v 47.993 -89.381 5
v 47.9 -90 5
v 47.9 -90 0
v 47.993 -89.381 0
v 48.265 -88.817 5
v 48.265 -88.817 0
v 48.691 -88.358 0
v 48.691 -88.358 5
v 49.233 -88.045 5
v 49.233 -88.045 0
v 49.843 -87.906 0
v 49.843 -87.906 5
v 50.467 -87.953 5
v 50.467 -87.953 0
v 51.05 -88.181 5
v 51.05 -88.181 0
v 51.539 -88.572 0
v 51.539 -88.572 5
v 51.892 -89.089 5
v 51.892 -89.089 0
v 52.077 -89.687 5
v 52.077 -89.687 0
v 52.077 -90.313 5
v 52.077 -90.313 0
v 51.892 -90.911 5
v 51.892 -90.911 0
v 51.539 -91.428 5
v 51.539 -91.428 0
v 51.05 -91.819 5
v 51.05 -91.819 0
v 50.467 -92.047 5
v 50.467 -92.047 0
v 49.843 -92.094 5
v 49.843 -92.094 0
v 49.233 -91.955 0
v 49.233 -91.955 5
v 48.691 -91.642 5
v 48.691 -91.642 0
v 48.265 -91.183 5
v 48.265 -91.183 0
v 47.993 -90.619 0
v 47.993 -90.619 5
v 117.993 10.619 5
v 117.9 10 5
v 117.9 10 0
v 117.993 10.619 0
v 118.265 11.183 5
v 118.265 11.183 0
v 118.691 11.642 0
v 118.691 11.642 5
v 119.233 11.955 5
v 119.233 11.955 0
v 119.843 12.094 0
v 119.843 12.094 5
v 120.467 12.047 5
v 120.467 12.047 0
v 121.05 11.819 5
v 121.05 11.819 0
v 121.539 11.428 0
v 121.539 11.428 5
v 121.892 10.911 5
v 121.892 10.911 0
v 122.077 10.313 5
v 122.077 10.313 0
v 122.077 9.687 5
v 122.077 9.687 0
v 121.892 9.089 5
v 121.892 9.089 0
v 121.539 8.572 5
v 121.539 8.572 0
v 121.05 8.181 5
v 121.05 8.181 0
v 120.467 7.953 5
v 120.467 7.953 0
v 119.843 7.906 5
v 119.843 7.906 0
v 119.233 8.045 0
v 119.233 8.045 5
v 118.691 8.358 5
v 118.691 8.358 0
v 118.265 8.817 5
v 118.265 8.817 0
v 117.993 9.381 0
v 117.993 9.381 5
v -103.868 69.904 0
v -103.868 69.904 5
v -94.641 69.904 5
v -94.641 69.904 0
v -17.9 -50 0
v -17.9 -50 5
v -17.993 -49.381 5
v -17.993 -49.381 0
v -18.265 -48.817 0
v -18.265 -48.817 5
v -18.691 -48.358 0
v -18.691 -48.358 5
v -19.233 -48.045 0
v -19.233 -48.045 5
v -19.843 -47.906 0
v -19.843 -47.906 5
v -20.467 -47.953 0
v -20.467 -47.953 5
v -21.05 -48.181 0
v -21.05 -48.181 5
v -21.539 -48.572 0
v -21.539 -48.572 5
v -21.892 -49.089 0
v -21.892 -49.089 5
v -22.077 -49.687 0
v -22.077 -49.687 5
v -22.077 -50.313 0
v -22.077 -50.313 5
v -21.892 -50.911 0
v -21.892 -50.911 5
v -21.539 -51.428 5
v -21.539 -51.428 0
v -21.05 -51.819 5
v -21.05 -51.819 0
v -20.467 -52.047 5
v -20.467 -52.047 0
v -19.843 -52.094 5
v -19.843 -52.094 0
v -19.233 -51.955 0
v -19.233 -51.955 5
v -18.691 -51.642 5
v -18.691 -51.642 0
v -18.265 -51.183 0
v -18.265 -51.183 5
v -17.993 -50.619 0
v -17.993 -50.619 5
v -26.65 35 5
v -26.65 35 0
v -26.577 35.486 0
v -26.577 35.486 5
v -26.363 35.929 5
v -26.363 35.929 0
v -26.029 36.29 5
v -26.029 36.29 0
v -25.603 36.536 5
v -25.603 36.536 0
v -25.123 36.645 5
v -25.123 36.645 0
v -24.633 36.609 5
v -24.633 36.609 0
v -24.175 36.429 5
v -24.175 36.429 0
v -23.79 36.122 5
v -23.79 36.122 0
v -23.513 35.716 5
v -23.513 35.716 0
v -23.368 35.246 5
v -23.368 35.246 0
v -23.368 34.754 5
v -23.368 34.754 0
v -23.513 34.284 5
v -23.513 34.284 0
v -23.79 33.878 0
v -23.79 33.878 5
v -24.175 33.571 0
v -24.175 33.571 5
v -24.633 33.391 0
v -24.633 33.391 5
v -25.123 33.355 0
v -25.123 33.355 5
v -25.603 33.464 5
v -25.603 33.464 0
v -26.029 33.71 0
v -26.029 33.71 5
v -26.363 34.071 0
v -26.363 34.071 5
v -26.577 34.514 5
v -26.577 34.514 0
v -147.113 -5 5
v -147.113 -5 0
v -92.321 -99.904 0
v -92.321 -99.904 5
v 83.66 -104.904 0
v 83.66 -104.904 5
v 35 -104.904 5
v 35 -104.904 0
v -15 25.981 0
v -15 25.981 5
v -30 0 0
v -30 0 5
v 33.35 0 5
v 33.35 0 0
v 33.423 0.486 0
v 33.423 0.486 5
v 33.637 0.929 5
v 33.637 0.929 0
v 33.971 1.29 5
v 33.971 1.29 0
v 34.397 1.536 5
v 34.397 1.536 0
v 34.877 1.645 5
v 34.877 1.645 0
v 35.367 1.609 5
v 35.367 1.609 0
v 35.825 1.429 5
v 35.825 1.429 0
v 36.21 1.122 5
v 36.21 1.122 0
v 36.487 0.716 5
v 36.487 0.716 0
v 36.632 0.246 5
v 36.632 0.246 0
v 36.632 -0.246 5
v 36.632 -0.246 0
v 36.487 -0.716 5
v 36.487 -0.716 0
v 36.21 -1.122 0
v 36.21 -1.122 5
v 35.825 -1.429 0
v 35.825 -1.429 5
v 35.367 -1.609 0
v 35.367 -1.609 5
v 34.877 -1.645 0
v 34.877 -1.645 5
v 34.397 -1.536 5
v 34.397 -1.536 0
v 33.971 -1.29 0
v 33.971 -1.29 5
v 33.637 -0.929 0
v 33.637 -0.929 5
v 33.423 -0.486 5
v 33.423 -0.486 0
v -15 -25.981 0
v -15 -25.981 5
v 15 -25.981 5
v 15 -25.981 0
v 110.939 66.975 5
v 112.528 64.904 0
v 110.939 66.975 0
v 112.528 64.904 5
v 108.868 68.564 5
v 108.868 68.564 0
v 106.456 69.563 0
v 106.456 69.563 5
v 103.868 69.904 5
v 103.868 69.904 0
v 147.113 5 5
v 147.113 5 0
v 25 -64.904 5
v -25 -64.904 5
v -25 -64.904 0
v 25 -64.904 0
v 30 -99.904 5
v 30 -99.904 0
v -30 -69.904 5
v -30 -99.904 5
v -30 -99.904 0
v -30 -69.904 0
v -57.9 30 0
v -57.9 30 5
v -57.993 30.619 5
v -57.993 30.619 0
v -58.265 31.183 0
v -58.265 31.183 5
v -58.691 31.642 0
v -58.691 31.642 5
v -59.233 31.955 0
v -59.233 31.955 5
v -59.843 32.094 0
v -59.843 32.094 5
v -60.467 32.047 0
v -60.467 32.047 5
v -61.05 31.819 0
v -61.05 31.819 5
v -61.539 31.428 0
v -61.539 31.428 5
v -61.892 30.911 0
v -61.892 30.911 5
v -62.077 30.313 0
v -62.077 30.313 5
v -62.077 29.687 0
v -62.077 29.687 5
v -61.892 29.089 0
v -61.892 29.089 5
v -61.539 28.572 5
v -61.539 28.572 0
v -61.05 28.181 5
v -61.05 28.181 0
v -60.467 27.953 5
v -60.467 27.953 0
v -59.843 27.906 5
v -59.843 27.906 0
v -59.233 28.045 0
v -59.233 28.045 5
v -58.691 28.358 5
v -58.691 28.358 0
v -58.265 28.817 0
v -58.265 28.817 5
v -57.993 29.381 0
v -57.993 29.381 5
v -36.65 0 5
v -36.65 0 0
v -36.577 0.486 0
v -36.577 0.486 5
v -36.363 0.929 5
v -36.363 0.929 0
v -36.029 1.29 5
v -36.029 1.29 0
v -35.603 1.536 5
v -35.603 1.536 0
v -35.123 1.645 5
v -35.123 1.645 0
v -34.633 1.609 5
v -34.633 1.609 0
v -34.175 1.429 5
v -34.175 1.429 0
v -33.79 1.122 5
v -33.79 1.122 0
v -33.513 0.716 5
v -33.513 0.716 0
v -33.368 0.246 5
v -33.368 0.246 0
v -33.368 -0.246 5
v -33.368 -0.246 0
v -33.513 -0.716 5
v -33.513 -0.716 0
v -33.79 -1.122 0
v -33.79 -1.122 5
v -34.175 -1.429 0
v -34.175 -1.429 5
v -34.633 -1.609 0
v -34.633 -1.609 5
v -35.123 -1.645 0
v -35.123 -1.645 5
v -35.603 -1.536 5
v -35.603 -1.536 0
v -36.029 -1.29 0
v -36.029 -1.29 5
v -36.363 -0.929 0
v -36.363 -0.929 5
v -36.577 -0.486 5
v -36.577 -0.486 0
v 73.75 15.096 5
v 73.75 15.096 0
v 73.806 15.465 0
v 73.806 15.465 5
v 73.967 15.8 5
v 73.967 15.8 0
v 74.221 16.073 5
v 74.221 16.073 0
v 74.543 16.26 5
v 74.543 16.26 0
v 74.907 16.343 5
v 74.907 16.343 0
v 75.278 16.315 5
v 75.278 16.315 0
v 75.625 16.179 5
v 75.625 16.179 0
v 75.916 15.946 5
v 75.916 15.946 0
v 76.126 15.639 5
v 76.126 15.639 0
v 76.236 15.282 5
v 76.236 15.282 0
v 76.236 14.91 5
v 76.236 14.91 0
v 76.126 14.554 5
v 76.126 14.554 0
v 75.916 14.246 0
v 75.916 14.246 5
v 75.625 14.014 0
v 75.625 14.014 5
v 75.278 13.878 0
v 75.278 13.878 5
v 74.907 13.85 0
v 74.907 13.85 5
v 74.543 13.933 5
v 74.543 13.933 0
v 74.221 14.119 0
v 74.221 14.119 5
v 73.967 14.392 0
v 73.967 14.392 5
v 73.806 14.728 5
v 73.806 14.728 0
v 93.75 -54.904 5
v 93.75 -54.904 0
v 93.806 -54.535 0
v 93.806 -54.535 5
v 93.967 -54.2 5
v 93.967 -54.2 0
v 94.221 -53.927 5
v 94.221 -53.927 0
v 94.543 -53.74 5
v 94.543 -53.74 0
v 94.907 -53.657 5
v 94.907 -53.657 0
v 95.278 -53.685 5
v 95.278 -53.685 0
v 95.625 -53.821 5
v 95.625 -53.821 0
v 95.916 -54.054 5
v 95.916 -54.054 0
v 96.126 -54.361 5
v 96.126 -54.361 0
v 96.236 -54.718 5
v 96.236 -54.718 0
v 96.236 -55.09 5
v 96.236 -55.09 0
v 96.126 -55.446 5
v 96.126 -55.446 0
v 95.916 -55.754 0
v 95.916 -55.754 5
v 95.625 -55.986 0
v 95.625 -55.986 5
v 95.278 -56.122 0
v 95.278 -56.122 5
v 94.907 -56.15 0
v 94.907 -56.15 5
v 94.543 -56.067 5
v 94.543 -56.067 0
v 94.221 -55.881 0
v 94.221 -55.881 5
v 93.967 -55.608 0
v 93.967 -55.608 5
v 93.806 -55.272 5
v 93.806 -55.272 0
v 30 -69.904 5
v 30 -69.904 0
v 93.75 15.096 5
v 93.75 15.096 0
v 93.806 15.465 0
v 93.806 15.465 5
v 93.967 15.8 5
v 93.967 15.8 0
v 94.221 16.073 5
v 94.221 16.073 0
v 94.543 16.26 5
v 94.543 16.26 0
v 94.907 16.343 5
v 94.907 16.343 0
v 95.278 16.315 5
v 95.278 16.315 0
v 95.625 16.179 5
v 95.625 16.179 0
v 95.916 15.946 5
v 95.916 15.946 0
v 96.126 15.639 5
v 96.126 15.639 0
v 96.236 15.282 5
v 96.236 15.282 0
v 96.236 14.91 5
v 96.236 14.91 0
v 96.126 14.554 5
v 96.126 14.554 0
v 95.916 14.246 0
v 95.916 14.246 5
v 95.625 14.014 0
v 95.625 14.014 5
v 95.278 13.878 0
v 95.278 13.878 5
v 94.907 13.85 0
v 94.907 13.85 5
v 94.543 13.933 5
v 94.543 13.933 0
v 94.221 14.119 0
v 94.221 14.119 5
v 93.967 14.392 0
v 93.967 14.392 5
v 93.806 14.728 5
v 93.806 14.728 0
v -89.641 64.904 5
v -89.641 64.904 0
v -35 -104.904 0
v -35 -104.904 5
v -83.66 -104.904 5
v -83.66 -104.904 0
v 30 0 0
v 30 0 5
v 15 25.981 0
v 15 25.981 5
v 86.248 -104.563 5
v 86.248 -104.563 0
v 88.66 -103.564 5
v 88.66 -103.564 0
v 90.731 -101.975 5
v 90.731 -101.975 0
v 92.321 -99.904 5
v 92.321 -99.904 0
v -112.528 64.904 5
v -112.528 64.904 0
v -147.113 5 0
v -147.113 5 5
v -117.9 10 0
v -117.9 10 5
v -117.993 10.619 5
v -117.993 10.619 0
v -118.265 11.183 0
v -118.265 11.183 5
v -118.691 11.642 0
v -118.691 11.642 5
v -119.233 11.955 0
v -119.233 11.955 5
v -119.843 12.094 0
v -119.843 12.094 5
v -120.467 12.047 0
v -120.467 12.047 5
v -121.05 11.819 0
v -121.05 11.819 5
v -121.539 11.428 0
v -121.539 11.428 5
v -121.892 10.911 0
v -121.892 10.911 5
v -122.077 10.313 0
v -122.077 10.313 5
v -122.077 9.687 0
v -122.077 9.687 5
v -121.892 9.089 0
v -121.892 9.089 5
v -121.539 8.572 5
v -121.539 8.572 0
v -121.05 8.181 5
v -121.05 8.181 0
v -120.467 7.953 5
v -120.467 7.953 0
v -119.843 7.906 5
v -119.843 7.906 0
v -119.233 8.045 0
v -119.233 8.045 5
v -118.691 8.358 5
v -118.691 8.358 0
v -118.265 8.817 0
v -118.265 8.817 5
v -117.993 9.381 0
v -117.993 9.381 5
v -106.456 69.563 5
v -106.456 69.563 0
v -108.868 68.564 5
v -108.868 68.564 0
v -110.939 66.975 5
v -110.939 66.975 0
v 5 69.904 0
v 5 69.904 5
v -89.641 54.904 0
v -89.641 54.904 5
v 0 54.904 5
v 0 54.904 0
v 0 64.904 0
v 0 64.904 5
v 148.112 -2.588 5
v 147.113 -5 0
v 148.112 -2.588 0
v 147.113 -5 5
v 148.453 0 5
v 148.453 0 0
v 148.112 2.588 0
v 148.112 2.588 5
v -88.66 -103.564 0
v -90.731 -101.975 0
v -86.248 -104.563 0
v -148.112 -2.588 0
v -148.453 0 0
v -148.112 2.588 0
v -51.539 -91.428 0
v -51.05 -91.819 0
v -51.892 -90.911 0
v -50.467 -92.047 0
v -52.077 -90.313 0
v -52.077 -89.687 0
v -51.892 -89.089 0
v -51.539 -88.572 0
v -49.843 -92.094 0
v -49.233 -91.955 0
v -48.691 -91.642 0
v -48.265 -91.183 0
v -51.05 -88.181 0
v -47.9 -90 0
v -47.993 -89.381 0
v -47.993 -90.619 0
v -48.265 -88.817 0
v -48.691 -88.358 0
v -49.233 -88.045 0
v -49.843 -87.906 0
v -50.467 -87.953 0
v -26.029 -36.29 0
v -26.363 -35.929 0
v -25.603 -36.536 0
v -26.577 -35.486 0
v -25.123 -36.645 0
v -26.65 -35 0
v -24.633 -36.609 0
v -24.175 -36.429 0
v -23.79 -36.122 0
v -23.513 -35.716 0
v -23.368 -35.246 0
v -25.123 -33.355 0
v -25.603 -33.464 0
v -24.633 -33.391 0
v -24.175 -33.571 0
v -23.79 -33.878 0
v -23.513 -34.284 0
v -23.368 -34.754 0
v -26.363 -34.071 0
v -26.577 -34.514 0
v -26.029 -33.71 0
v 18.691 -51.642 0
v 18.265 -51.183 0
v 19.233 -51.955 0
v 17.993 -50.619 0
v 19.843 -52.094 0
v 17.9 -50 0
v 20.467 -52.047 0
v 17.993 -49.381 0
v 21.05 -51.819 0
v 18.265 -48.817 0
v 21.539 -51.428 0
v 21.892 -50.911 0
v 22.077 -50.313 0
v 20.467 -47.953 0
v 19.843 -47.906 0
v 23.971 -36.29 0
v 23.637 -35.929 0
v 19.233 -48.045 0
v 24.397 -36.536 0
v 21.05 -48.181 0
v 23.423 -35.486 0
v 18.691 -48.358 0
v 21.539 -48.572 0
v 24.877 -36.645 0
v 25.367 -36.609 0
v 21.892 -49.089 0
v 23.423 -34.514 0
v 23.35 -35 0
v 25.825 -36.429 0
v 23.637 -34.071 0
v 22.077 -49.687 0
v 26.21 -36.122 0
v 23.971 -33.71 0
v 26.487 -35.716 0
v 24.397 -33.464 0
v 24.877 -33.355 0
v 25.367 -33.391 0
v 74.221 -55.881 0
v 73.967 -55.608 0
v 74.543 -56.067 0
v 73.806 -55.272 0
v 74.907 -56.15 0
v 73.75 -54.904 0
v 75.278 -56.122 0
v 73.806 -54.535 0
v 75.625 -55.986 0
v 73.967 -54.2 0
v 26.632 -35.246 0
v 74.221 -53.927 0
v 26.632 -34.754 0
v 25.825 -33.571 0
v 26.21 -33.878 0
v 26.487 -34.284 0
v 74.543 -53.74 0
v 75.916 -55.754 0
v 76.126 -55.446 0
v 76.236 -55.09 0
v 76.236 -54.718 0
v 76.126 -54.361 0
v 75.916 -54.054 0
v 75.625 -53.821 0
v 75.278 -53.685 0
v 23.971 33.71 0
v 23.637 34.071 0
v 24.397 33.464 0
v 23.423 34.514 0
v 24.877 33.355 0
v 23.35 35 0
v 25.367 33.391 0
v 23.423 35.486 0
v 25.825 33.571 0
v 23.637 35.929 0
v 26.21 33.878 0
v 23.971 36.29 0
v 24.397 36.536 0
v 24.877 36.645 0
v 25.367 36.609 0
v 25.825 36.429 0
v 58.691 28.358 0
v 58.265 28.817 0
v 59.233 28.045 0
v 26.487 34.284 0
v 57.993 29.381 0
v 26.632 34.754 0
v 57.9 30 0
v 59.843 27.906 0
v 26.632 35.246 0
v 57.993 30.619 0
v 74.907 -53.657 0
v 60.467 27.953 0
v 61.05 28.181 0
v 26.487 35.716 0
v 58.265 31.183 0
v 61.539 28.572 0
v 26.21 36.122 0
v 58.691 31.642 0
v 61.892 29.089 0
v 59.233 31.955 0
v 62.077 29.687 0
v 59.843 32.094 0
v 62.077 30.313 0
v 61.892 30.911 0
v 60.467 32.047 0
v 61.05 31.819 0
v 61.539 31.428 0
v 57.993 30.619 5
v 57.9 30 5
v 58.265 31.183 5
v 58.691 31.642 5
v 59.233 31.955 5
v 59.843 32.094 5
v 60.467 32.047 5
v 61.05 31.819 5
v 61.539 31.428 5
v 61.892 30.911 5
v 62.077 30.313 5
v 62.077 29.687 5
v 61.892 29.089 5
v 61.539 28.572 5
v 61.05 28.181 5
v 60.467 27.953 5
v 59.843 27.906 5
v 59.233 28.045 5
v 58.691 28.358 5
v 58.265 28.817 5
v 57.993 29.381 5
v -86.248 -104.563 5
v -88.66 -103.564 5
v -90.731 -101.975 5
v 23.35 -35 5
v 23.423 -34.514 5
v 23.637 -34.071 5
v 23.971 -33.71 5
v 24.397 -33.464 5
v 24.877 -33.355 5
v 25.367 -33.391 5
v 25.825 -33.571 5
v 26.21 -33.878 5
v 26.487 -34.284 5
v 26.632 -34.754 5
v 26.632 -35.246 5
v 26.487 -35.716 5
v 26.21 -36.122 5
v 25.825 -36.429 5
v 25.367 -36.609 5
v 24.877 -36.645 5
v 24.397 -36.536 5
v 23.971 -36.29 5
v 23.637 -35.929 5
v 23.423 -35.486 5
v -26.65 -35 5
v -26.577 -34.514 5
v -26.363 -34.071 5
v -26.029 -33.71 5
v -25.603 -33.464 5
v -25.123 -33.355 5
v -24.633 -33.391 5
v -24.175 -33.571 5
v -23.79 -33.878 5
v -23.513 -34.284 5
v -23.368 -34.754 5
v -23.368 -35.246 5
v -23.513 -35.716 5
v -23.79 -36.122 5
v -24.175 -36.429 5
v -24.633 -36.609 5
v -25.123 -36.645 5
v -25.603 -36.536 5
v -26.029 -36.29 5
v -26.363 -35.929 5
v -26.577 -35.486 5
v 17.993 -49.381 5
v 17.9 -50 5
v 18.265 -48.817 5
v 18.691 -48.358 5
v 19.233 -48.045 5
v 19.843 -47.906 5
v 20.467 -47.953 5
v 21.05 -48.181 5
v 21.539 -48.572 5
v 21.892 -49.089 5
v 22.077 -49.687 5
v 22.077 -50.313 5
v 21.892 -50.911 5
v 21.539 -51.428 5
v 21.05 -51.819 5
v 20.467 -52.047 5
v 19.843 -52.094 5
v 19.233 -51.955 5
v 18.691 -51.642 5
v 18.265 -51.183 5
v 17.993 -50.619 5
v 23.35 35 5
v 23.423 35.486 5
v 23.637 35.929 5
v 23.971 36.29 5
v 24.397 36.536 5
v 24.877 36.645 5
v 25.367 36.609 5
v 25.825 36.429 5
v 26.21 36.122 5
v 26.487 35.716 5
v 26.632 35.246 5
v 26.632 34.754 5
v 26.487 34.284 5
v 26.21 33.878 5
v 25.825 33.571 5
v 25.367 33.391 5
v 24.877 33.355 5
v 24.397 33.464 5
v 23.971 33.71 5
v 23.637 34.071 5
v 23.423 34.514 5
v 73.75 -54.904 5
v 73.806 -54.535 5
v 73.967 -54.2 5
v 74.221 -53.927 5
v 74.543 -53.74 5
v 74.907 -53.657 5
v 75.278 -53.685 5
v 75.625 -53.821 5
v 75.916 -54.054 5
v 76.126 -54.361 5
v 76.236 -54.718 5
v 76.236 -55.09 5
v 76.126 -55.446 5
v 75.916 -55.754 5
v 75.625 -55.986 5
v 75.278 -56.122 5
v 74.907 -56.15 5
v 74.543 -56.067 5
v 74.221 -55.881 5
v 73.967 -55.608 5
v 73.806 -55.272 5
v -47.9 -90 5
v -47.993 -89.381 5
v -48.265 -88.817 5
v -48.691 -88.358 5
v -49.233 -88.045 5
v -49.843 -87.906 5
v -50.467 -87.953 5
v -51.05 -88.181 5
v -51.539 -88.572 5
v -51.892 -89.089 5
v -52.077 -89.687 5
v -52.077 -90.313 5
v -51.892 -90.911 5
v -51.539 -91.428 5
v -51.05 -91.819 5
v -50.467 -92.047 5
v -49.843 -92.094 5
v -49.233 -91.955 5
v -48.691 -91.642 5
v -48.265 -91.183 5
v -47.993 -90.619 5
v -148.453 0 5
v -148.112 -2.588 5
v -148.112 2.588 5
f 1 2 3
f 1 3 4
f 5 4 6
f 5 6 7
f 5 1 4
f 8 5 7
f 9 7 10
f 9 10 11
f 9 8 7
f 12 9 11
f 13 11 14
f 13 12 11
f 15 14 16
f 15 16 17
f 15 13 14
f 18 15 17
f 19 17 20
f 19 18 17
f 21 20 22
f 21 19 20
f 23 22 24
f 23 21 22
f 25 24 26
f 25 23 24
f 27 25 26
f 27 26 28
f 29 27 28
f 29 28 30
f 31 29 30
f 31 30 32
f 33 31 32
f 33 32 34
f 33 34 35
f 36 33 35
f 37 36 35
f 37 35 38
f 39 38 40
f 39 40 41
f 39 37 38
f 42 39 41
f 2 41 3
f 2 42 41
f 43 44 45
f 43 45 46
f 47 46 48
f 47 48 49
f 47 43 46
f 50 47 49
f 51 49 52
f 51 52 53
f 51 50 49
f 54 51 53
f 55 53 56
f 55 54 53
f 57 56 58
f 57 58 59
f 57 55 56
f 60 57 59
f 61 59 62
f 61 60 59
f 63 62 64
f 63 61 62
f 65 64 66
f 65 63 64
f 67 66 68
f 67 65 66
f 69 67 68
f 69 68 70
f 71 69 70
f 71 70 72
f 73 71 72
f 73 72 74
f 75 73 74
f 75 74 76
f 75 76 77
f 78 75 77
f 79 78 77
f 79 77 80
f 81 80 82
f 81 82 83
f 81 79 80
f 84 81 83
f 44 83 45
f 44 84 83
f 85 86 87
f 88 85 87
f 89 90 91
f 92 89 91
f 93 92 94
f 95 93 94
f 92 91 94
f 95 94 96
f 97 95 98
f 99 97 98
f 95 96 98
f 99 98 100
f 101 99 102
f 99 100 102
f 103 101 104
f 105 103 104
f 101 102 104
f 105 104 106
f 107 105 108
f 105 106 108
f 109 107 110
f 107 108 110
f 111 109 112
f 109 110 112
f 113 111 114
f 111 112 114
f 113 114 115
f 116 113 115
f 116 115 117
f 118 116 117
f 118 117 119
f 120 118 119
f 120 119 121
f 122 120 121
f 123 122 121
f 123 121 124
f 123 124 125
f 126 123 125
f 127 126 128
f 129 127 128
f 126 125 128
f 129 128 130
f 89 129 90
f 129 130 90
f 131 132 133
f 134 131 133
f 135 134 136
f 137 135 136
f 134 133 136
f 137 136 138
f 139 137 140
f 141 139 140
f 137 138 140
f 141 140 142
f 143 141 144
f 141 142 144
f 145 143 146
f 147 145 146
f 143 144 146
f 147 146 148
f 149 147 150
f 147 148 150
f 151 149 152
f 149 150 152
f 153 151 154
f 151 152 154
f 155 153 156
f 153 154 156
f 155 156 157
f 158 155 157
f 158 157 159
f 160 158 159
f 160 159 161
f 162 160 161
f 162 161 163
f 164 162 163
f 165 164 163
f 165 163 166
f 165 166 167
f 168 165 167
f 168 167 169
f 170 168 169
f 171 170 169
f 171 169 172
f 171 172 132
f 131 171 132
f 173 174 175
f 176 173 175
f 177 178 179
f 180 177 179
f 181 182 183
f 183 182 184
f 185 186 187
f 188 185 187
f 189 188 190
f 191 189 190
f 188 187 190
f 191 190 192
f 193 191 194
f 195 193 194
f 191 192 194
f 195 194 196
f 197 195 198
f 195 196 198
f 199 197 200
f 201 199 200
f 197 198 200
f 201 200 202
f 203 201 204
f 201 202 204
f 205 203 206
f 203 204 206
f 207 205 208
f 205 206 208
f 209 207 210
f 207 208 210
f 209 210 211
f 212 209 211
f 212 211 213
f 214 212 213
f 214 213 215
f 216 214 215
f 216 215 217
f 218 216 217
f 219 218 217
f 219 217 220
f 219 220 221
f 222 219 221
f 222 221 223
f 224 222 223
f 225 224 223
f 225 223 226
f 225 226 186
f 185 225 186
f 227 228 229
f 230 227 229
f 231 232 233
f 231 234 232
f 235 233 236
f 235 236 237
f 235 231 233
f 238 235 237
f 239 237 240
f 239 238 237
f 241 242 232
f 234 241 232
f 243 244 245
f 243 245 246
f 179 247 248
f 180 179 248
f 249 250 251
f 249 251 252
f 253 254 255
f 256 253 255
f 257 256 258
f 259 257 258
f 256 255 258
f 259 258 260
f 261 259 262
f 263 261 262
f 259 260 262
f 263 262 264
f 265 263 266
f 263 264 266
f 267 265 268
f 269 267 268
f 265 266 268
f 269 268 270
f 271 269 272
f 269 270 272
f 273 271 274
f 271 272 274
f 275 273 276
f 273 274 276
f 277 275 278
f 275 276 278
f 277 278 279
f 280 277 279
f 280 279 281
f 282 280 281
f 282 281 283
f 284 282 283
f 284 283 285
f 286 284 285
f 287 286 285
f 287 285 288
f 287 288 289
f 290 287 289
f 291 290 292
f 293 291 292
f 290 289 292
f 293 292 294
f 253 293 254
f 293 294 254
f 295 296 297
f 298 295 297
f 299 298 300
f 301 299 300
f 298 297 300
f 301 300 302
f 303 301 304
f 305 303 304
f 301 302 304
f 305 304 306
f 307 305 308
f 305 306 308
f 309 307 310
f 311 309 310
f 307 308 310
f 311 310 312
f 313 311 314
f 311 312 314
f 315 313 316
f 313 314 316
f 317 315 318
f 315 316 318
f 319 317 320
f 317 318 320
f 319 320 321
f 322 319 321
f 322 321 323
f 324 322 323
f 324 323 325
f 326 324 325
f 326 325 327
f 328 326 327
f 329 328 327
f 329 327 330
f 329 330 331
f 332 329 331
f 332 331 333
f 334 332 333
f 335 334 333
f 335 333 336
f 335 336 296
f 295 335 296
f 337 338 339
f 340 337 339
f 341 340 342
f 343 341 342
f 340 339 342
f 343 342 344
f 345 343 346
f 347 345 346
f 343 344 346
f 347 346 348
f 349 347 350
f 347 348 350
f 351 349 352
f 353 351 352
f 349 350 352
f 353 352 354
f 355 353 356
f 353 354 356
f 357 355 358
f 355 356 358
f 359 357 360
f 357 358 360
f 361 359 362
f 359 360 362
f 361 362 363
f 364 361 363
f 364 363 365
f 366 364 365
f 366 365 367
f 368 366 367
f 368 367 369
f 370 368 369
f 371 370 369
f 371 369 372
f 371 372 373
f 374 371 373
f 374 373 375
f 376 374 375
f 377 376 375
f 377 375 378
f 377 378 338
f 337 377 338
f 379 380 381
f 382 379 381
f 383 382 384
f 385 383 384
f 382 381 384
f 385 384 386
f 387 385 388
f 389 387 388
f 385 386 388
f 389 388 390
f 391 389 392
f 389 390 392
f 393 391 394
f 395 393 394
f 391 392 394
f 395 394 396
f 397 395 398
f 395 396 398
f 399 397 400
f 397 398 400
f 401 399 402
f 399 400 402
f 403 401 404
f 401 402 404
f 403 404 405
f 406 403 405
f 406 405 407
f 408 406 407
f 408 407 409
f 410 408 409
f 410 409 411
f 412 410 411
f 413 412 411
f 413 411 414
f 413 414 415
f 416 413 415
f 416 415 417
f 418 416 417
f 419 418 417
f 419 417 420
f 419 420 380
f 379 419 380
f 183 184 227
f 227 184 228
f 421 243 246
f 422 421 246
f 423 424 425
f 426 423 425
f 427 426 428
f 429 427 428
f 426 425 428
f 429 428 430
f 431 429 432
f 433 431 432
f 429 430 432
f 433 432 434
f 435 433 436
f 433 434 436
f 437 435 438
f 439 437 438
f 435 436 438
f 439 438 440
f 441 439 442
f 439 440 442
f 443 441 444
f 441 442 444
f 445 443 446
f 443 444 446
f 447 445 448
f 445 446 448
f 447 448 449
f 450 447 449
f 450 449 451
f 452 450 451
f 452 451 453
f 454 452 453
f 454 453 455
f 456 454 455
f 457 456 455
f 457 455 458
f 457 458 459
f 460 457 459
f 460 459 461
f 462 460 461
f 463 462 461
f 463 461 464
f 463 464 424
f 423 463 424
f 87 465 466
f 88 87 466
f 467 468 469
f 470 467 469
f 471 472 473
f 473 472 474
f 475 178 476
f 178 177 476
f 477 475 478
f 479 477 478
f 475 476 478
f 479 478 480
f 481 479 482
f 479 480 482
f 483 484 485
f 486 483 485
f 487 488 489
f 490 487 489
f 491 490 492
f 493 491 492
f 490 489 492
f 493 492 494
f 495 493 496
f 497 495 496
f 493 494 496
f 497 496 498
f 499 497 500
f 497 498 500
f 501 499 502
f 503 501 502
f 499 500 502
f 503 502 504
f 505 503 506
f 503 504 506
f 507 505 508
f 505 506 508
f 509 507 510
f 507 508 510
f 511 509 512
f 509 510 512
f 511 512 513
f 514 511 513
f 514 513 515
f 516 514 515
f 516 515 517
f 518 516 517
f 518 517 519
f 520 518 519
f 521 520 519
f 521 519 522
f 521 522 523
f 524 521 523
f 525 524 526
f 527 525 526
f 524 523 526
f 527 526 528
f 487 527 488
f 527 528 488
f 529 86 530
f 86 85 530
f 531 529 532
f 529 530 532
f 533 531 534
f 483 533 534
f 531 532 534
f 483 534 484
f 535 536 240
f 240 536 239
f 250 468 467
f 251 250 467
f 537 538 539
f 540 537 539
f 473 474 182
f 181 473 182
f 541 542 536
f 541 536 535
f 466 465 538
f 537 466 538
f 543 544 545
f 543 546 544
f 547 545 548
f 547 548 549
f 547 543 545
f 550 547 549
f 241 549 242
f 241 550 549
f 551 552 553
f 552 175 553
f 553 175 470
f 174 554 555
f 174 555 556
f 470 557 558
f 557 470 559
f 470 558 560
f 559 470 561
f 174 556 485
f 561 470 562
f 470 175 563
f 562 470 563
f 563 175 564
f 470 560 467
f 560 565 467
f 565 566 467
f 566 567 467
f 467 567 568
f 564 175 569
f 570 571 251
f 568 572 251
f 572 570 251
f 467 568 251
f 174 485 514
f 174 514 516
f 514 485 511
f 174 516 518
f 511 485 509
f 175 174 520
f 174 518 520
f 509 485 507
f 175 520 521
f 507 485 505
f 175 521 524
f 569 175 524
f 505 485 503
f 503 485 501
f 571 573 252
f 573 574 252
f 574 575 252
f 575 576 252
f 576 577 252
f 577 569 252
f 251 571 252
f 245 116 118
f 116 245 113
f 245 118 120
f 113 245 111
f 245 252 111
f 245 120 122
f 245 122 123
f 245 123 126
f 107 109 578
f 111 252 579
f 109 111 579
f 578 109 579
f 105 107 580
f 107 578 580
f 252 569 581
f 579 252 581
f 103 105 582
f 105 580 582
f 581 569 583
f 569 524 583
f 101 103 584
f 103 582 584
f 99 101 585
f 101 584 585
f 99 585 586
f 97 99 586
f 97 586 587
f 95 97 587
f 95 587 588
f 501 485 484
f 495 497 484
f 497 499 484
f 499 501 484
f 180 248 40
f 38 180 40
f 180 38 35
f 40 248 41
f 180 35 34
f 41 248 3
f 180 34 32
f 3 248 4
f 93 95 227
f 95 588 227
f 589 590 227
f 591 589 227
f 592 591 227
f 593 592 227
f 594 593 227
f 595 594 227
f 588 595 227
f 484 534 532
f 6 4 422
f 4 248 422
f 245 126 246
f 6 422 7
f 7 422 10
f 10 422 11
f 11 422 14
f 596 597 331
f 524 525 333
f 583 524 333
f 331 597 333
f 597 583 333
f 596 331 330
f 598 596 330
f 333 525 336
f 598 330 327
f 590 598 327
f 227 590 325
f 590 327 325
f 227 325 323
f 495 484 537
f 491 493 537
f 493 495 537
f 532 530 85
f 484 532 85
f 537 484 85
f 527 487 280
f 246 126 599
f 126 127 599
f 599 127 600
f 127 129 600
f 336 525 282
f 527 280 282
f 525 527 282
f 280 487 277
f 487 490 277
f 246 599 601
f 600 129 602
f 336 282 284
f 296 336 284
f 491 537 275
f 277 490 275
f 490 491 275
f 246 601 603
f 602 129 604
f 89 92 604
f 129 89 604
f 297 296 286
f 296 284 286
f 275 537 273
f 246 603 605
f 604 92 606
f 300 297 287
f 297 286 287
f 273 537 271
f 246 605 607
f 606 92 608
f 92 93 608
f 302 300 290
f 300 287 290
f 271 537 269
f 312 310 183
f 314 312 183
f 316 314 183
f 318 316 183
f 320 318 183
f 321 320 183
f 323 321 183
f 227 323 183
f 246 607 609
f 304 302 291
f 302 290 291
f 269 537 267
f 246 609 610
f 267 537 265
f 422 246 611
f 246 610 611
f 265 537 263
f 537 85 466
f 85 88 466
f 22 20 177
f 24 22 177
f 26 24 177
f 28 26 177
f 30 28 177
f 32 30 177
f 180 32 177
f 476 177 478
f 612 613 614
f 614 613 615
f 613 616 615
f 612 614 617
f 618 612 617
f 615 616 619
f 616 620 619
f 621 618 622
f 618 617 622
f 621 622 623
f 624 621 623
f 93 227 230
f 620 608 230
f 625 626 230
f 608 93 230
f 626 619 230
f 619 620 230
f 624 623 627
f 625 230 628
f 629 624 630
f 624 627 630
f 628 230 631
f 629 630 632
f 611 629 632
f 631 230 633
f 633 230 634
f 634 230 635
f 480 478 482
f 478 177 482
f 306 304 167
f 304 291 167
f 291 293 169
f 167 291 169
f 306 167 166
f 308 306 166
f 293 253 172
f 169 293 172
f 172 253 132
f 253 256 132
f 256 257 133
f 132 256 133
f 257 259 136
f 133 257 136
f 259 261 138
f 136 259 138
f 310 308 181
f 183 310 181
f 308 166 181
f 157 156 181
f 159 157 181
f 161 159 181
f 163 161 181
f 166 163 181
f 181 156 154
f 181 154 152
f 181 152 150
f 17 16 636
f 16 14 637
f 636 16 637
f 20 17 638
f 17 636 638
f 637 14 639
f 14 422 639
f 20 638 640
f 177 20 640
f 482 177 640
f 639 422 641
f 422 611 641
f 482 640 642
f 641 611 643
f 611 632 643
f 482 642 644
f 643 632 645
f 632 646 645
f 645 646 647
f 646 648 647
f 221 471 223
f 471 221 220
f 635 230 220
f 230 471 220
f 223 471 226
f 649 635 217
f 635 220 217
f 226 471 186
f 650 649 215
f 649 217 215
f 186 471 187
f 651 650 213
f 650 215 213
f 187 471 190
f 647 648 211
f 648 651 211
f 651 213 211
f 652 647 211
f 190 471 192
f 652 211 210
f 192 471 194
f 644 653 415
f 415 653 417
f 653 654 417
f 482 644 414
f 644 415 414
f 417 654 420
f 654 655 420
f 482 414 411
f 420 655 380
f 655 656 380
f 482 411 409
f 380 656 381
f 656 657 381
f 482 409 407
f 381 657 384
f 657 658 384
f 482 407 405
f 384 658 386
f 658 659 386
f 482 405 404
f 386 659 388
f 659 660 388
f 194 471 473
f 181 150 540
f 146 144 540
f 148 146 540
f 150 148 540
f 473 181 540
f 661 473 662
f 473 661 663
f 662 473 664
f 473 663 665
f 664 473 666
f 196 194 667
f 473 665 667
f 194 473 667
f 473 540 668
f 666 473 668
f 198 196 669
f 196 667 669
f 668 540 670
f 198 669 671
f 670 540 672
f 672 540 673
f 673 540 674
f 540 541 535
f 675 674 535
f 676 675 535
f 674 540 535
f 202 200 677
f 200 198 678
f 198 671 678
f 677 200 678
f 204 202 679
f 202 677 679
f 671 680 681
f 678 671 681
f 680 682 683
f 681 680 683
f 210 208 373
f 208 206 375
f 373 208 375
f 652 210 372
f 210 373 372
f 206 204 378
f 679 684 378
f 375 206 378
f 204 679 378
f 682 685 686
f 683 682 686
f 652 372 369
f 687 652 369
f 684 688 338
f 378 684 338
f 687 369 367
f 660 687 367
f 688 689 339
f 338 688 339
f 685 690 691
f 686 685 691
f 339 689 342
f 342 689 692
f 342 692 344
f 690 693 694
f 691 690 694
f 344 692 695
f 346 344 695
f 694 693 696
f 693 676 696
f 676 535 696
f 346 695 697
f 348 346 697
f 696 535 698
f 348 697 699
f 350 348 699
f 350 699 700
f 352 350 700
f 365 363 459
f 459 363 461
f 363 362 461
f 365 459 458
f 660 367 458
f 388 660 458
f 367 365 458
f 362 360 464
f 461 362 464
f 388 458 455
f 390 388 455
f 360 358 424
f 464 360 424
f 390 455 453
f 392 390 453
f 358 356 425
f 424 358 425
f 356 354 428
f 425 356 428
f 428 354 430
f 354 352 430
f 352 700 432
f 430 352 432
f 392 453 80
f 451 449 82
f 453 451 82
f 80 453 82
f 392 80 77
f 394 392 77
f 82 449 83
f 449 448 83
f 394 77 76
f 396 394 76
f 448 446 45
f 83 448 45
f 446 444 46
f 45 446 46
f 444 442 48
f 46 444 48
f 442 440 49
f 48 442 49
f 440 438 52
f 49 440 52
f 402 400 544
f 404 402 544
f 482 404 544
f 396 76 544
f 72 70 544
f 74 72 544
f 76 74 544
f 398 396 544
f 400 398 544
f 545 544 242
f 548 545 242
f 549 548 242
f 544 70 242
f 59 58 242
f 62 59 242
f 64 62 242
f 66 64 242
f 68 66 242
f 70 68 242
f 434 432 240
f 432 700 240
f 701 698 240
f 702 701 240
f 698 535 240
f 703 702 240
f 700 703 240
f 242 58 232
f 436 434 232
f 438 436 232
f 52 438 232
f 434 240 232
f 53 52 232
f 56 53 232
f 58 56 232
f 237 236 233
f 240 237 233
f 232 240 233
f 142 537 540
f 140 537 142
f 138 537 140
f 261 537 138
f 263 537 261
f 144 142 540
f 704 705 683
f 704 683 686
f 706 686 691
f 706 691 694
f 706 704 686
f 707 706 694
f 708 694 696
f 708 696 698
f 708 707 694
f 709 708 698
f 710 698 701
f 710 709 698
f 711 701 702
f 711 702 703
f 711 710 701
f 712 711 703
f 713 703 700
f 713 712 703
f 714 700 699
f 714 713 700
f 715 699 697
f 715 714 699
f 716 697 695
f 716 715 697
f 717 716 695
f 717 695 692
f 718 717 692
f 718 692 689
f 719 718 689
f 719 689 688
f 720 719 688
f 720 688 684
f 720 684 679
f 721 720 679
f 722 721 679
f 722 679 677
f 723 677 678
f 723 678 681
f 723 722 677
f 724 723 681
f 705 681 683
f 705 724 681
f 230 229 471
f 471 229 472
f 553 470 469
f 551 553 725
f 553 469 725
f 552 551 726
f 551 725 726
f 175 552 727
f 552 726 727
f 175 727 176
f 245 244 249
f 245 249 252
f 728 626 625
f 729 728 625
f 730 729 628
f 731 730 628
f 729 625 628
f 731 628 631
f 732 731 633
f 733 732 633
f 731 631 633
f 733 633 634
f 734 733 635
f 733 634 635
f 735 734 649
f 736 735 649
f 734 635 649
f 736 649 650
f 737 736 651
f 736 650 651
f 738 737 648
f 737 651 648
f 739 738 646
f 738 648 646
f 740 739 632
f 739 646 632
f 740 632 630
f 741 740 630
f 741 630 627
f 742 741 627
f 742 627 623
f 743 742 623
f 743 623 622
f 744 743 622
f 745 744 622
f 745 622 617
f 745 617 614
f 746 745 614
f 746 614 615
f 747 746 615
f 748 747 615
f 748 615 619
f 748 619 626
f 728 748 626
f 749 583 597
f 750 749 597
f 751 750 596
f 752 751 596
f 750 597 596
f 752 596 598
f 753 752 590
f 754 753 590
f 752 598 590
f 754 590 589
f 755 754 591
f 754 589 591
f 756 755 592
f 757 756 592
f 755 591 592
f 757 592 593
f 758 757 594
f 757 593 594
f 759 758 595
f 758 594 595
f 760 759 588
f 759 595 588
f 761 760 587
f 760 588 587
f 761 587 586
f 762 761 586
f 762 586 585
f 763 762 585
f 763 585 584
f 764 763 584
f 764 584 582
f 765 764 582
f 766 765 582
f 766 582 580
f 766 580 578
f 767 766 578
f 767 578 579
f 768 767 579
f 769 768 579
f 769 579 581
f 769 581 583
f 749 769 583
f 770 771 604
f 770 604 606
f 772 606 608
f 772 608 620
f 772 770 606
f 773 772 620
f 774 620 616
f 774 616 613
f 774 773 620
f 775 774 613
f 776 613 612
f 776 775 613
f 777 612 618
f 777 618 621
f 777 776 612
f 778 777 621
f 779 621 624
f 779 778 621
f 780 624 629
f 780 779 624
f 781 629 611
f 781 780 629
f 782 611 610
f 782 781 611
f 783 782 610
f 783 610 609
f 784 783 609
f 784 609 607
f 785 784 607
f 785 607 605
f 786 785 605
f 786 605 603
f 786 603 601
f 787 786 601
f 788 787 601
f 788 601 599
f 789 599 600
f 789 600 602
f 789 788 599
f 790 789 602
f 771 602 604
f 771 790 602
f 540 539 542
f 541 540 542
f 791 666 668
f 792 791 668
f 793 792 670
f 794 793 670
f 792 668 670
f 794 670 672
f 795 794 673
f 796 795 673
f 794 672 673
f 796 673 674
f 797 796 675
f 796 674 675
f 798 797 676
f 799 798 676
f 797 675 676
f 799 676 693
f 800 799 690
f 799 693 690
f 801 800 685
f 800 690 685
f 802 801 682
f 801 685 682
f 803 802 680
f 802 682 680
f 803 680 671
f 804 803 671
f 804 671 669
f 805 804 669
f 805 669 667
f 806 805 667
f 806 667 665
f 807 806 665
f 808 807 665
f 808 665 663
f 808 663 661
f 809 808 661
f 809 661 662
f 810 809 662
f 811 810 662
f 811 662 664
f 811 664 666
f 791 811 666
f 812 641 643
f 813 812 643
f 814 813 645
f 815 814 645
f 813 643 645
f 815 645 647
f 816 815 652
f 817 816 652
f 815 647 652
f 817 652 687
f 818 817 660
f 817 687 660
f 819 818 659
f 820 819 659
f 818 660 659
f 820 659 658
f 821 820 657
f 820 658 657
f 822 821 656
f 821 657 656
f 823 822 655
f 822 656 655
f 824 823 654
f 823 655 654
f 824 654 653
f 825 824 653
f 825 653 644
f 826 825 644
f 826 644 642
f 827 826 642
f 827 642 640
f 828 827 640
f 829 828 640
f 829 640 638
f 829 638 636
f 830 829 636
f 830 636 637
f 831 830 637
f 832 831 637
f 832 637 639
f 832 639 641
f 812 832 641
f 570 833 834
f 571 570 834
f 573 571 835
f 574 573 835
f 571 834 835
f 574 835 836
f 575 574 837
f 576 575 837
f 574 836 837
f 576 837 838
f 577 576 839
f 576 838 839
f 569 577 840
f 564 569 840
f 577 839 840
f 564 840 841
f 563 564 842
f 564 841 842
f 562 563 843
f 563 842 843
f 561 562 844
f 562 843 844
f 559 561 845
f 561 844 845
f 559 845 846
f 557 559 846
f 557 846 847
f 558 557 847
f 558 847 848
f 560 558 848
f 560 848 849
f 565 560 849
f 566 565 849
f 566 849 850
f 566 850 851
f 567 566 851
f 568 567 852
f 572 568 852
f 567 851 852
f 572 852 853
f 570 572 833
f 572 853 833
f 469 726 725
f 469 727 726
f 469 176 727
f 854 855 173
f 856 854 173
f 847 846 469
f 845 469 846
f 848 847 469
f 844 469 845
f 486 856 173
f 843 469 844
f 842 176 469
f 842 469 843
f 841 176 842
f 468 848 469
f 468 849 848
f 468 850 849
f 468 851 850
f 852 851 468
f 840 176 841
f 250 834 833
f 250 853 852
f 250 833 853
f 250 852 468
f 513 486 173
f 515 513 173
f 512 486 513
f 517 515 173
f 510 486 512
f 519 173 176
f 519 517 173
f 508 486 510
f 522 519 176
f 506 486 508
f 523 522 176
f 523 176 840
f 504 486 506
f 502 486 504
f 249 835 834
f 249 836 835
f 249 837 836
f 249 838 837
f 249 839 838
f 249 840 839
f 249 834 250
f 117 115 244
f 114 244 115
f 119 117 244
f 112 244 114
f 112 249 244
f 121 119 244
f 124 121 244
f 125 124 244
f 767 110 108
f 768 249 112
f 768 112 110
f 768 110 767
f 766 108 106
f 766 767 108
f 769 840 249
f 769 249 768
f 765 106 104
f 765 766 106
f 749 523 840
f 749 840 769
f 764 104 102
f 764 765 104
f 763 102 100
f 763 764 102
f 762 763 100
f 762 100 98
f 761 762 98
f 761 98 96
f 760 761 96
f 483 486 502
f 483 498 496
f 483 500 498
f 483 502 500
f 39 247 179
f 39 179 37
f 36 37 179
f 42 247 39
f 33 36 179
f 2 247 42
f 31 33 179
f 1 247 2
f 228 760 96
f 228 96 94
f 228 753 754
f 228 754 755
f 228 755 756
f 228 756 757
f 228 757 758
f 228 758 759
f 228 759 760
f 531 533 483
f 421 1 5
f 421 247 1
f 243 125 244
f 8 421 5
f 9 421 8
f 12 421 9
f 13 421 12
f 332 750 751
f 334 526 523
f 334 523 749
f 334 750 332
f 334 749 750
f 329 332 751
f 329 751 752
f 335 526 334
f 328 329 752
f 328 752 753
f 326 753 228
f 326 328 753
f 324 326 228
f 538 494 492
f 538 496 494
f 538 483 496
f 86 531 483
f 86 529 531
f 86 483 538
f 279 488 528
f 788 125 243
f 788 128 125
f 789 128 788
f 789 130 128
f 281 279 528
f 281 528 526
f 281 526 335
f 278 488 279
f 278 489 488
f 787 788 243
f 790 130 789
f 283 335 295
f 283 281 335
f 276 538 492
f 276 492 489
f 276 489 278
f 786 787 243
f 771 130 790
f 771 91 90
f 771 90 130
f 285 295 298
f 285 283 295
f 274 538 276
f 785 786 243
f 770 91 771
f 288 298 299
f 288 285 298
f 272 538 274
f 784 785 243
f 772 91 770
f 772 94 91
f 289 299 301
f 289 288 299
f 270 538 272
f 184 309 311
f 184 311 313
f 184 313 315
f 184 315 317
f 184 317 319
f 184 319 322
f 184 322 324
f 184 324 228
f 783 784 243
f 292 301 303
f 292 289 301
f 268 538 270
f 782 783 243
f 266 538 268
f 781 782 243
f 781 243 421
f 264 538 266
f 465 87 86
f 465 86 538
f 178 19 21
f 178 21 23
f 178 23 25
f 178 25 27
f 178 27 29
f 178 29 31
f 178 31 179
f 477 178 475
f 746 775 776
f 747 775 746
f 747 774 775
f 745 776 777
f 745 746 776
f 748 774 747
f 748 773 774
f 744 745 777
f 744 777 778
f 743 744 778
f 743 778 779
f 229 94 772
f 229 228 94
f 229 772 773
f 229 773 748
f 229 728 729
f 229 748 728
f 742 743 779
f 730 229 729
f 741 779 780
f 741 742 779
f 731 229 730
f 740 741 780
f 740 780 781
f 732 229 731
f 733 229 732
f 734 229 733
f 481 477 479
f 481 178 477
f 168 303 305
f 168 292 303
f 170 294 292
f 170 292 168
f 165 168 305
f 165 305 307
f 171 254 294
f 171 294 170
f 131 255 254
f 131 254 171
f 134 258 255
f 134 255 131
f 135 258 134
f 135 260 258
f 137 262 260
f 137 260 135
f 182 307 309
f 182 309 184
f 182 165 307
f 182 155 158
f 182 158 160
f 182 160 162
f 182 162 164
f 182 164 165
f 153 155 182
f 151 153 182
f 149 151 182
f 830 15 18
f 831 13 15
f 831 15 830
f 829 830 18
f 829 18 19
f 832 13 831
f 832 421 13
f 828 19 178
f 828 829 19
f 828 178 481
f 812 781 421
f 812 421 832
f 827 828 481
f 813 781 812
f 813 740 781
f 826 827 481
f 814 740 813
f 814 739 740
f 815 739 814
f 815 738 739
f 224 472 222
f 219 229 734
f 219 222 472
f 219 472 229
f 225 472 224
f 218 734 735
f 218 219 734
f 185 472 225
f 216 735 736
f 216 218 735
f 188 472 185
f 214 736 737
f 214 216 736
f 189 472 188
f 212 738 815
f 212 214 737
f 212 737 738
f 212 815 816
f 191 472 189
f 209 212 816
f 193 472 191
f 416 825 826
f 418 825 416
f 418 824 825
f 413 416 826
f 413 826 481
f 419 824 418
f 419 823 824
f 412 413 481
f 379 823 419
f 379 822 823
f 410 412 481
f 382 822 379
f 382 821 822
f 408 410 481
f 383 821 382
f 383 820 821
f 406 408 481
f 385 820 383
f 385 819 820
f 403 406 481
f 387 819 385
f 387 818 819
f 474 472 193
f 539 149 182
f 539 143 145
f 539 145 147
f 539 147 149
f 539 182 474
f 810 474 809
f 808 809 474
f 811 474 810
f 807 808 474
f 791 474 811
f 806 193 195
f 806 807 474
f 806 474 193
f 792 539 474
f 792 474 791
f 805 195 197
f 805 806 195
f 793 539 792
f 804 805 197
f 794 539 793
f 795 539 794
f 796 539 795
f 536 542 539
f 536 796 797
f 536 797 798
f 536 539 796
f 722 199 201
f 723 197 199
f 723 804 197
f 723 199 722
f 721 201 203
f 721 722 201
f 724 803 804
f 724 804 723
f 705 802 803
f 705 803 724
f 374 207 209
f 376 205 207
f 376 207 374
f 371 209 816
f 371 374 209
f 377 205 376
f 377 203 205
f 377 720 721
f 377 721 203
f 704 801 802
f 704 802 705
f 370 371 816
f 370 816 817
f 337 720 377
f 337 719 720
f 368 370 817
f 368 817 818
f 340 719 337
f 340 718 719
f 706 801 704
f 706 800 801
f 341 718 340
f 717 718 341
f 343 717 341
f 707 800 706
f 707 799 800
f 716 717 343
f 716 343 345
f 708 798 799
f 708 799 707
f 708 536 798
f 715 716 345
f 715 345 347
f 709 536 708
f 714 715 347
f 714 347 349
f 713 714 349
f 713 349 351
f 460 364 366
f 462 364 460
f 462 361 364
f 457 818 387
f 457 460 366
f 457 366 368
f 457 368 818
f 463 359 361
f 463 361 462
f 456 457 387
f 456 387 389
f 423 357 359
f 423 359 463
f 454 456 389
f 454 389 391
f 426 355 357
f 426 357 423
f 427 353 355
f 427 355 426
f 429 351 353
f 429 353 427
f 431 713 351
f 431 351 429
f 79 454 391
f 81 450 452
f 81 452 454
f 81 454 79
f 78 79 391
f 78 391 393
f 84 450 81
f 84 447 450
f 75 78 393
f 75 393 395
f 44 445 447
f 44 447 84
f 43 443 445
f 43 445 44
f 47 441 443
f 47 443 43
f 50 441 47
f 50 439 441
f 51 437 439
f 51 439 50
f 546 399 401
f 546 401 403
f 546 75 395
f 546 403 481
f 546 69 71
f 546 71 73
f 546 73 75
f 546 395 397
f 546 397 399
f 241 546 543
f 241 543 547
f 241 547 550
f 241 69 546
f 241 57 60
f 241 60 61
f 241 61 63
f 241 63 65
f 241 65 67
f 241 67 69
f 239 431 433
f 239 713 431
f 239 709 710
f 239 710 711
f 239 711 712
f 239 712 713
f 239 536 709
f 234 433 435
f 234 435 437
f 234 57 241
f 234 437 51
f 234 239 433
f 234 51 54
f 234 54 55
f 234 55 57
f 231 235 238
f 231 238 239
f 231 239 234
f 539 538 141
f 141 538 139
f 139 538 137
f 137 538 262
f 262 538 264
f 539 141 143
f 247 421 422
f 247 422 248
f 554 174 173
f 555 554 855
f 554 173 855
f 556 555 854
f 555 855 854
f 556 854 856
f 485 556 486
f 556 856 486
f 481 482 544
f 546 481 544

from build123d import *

# Parameters (mm, degrees)
EXTRUDE_1_DEPTH          = 5
CUT_EXTRUDE_2_DEPTH      = 1
CUT_EXTRUDE_2_DEPTH_BACK = 6
CUT_EXTRUDE_3_REACH      = 7
CHAMFER_1_SIZE           = 5
CUT_EXTRUDE_6_DEPTH      = 1
CUT_EXTRUDE_6_DEPTH_BACK = 6
CHAMFER_2_SIZE           = 5
SKETCH_6_R               = 2.1
CUT_EXTRUDE_7_DEPTH      = 5
FILLET_1_R               = 10
M3X0_5_1_D               = 2.5
M3X0_5_1_DEPTH           = 8.5
M3X0_5_1_TIP             = 0.751075774
M4X0_7_2_D               = 3.3
M4X0_7_2_DEPTH           = 11.5
M4X0_7_2_TIP             = 0.991420021


with BuildPart() as part:
    # 草圖1 → 填料-伸長1 (new body)
    with BuildSketch(Plane.XY):
        Polygon((150, 0), (75, 129.903810568), (-75, 129.903810568), (-150, 0), (-75, -129.903810568), (75, -129.903810568), align=None)
    extrude(amount=EXTRUDE_1_DEPTH)

    # 草圖3 → 除料-伸長2 (cut, two sides)
    with BuildSketch(Plane.XY.offset(5)) as cut_extrude_2_sk:
        Polygon((-774.886138932, 69.903810568), (-109.641016151, 69.903810568), (-89.641016151, 69.903810568), (-89.641016151, 54.903810568), (0, 54.903810568), (0, 69.903810568), (109.641016151, 69.903810568), (774.886138932, 69.903810568), (774.886138932, 1400.394056128), (-774.886138932, 1400.394056128), align=None)
    extrude(amount=CUT_EXTRUDE_2_DEPTH, mode=Mode.SUBTRACT)
    extrude(cut_extrude_2_sk.sketch, amount=-CUT_EXTRUDE_2_DEPTH_BACK, mode=Mode.SUBTRACT)

    # 草圖4 → 除料-伸長3 (cut, up to next)
    with BuildSketch(Plane.XY.offset(5), mode=Mode.PRIVATE) as cut_extrude_3_sk1:
        Polygon((30, 0), (15, 25.980762114), (-15, 25.980762114), (-30, 0), (-15, -25.980762114), (15, -25.980762114), align=None)
    cut_extrude_3_tool1 = extrude(cut_extrude_3_sk1.sketch, amount=-CUT_EXTRUDE_3_REACH, mode=Mode.PRIVATE) & part.part
    add(cut_extrude_3_tool1.solids().sort_by_distance((0, 0, 5))[0], mode=Mode.SUBTRACT)

    # 導角1
    chamfer_1_edges = [part.edges().sort_by_distance(p)[0] for p in [
        (-89.641016151, 69.903810568, 2.5),
        (0, 69.903810568, 2.5),
    ]]
    chamfer(chamfer_1_edges, length=CHAMFER_1_SIZE)

    # 草圖5 → 除料-伸長6 (cut, two sides)
    with BuildSketch(Plane.XY.offset(5)) as cut_extrude_6_sk:
        Polygon((-692.345987228, -104.903810568), (-89.43375673, -104.903810568), (-30, -104.903810568), (-30, -64.903810568), (30, -64.903810568), (30, -104.903810568), (89.43375673, -104.903810568), (692.345987228, -104.903810568), (692.345987228, -1310.728271565), (-692.345987228, -1310.728271565), align=None)
    extrude(amount=CUT_EXTRUDE_6_DEPTH, mode=Mode.SUBTRACT)
    extrude(cut_extrude_6_sk.sketch, amount=-CUT_EXTRUDE_6_DEPTH_BACK, mode=Mode.SUBTRACT)

    # 導角2
    chamfer_2_edges = [part.edges().sort_by_distance(p)[0] for p in [
        (30, -104.903810568, 2.5),
        (-30, -104.903810568, 2.5),
        (-30, -64.903810568, 2.5),
        (30, -64.903810568, 2.5),
    ]]
    chamfer(chamfer_2_edges, length=CHAMFER_2_SIZE)

    # 草圖6 → 除料-伸長7 (cut)
    with BuildSketch(Plane.XY.offset(5)):
        with Locations((-50, -90)):
            Circle(SKETCH_6_R)
        with Locations((-120, 10)):
            Circle(SKETCH_6_R)
        with Locations((-60, 30)):
            Circle(SKETCH_6_R)
        with Locations((-20, -50)):
            Circle(SKETCH_6_R)
    cut_extrude_7 = extrude(amount=-CUT_EXTRUDE_7_DEPTH, mode=Mode.SUBTRACT)

    # 鏡射1: 除料-伸長7 across plane
    add(cut_extrude_7.mirror(Plane(origin=(0, 0, 0), x_dir=(0, 0, 1), z_dir=(1, 0, 0))), mode=Mode.SUBTRACT)

    # 圓角1
    fillet_1_edges = [part.edges().sort_by_distance(p)[0] for p in [
        (-150, 0, 2.5),
        (150, 0, 2.5),
        (109.641016151, 69.903810568, 2.5),
        (-109.641016151, 69.903810568, 2.5),
        (-89.43375673, -104.903810568, 2.5),
        (89.43375673, -104.903810568, 2.5),
    ]]
    fillet(fillet_1_edges, radius=FILLET_1_R)

    # M3x0.5 螺紋孔1
    with Locations(Plane.XY.offset(5)):
        with Locations((95, 15.096189432), (75, -54.903810568), (75, 15.096189432), (95, -54.903810568)):
            Hole(M3X0_5_1_D / 2, depth=M3X0_5_1_DEPTH)
            with Locations((0, 0, -(M3X0_5_1_DEPTH + M3X0_5_1_TIP / 2))):  # 118° drill point
                Cone(0, M3X0_5_1_D / 2, M3X0_5_1_TIP, mode=Mode.SUBTRACT)

    # M4x0.7 螺紋孔2
    with Locations(Plane.XY.offset(5)):
        with Locations((25, 35), (-25, -35), (-25, 35), (25, -35), (-35, 0), (35, 0)):
            Hole(M4X0_7_2_D / 2, depth=M4X0_7_2_DEPTH)
            with Locations((0, 0, -(M4X0_7_2_DEPTH + M4X0_7_2_TIP / 2))):  # 118° drill point
                Cone(0, M4X0_7_2_D / 2, M4X0_7_2_TIP, mode=Mode.SUBTRACT)


solid = part.part
